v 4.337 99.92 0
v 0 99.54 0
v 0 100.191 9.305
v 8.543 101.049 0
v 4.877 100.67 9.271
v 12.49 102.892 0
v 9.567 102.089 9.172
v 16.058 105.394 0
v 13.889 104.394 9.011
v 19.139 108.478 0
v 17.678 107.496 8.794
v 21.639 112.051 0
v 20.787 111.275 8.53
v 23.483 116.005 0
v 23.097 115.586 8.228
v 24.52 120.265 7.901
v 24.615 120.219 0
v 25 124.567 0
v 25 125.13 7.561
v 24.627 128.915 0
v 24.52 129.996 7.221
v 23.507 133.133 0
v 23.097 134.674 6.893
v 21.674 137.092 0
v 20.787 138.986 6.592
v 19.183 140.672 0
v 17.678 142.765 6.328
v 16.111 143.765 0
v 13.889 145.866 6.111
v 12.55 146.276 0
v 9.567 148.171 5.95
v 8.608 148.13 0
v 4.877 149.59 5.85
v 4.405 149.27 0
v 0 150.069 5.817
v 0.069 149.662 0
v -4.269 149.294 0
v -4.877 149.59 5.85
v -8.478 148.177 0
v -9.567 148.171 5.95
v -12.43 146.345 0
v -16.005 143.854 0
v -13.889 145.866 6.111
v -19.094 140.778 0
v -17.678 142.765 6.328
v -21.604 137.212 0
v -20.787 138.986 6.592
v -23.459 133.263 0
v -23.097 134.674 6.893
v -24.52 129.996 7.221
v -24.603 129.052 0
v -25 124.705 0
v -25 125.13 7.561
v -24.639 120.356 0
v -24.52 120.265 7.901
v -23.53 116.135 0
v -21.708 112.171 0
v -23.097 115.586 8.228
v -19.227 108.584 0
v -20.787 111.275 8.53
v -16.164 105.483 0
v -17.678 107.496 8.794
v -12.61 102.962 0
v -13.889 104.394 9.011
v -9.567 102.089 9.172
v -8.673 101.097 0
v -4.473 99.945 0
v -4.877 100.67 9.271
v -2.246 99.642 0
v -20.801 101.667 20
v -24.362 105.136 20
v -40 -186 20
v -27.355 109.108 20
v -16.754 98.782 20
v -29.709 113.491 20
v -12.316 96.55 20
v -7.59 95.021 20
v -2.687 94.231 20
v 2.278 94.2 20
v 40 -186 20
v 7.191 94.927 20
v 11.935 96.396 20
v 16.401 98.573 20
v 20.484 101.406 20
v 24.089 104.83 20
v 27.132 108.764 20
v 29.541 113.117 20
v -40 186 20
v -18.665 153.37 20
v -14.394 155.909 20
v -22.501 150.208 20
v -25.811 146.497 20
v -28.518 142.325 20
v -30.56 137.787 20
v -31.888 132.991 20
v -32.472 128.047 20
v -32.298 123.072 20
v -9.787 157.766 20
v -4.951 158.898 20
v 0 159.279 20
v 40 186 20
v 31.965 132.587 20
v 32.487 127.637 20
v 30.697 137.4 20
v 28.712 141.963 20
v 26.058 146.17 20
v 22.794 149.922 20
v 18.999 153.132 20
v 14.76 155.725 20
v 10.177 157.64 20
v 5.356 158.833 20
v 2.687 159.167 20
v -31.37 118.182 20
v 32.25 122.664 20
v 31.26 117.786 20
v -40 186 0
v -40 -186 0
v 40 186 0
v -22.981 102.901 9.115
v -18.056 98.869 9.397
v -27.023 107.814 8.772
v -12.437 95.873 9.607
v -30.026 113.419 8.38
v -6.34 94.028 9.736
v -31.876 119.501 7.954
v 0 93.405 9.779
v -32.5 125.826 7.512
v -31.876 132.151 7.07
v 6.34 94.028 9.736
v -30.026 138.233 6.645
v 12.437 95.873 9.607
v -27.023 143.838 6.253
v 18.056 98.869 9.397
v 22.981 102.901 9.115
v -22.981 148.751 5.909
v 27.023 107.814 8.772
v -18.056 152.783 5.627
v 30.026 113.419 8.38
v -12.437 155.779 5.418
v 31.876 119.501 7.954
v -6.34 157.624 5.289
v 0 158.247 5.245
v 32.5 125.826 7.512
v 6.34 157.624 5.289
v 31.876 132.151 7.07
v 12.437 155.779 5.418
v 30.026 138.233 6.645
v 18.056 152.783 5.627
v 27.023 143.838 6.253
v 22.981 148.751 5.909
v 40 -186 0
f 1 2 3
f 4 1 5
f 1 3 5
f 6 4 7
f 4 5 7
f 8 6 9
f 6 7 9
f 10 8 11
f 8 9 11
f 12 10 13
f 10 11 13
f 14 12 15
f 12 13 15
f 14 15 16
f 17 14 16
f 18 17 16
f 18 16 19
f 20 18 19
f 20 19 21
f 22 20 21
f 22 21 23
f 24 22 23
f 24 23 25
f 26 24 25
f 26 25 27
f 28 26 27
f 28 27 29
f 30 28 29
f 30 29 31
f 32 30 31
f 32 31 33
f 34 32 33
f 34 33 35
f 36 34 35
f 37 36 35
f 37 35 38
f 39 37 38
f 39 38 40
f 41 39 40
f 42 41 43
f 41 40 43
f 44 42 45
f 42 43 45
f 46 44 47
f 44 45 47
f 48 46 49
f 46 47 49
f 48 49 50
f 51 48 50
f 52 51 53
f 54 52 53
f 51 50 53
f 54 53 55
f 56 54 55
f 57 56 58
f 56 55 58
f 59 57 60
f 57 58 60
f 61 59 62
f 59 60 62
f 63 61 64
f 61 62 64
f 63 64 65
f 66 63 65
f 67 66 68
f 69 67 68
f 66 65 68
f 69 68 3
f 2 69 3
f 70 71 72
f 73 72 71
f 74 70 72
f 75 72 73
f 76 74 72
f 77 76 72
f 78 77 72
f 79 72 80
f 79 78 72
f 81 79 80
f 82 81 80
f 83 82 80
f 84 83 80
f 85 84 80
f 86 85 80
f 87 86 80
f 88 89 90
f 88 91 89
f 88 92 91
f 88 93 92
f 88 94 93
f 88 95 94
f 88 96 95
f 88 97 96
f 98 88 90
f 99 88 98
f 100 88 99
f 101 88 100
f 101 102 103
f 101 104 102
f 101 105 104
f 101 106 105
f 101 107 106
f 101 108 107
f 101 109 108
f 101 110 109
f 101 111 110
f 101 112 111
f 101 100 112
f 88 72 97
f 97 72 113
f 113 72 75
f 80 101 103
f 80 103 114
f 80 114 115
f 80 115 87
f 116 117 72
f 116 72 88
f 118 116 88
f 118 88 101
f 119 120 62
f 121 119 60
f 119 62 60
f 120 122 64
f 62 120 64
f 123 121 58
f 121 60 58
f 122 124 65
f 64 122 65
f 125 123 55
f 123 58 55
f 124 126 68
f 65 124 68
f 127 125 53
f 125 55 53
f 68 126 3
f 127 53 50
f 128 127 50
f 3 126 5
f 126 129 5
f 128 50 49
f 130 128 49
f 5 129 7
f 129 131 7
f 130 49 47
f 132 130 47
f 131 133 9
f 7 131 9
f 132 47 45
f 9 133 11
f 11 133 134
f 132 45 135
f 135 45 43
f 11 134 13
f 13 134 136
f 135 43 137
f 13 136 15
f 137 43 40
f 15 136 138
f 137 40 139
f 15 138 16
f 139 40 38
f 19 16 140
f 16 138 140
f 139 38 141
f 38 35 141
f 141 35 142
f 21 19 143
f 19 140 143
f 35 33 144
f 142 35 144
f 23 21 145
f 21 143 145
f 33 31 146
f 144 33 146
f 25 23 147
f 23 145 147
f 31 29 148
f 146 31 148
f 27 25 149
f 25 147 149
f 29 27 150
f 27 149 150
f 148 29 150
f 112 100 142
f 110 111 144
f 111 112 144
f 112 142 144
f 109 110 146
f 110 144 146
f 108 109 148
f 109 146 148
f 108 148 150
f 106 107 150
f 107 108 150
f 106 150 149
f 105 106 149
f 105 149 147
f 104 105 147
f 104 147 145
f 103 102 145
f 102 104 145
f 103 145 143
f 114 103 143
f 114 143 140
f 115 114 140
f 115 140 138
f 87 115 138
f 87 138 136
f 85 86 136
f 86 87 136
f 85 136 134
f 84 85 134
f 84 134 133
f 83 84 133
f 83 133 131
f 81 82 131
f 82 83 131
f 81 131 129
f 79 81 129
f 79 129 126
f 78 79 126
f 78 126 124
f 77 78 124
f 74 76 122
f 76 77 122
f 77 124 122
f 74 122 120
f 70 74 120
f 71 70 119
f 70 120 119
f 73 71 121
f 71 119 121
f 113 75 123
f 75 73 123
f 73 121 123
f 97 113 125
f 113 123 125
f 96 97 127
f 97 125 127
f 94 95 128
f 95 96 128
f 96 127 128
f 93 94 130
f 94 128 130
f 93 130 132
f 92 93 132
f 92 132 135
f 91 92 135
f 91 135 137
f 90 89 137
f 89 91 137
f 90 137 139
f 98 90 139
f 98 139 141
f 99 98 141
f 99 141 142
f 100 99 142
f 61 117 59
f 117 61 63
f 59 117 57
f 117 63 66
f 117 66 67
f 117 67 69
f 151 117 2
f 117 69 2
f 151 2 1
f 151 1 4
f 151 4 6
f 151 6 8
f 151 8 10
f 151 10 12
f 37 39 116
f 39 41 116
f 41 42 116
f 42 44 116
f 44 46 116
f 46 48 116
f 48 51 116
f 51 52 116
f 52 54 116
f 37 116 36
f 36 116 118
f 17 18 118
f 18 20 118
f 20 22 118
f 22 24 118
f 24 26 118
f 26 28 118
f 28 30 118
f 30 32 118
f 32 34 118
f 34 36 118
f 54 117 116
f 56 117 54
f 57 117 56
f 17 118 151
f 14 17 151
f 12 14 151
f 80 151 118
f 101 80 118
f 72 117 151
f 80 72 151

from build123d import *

# Parameters (mm, degrees)
SKETCH1_W           = 80
SKETCH1_H           = 372
BOSS_EXTRUDE1_DEPTH = 20
SKETCH4_R           = 32.5
CUT_EXTRUDE2_DEPTH  = 193.049397179
SKETCH5_R           = 25
CUT_EXTRUDE3_DEPTH  = 193.049397179


with BuildPart() as part:
    # Sketch1 → Boss-Extrude1 (new body)
    with BuildSketch(Plane.XY):
        Rectangle(SKETCH1_W, SKETCH1_H)
    extrude(amount=BOSS_EXTRUDE1_DEPTH)

    # Sketch4 → Cut-Extrude2 (cut, through all)
    with BuildSketch(Plane(origin=(0, 1.135010798, 16.231410618), x_dir=(1, 0, 0), z_dir=(0, -0.06975647374412888, -0.997564050259824))):
        with Locations(Location((0, -124.995505595, 0), (0, 0, 270))):
            Circle(SKETCH4_R)
    extrude(amount=-CUT_EXTRUDE2_DEPTH, mode=Mode.SUBTRACT)

    # Sketch5 → Cut-Extrude3 (cut, through all)
    with BuildSketch(Plane(origin=(0, 1.135010798, 16.231410618), x_dir=(1, 0, 0), z_dir=(0, 0.06975647374412888, 0.9975640502598241))):
        with Locations(Location((0, 124.297940858, 0), (0, 0, 270))):
            Circle(SKETCH5_R)
    extrude(amount=-CUT_EXTRUDE3_DEPTH, mode=Mode.SUBTRACT)


solid = part.part
